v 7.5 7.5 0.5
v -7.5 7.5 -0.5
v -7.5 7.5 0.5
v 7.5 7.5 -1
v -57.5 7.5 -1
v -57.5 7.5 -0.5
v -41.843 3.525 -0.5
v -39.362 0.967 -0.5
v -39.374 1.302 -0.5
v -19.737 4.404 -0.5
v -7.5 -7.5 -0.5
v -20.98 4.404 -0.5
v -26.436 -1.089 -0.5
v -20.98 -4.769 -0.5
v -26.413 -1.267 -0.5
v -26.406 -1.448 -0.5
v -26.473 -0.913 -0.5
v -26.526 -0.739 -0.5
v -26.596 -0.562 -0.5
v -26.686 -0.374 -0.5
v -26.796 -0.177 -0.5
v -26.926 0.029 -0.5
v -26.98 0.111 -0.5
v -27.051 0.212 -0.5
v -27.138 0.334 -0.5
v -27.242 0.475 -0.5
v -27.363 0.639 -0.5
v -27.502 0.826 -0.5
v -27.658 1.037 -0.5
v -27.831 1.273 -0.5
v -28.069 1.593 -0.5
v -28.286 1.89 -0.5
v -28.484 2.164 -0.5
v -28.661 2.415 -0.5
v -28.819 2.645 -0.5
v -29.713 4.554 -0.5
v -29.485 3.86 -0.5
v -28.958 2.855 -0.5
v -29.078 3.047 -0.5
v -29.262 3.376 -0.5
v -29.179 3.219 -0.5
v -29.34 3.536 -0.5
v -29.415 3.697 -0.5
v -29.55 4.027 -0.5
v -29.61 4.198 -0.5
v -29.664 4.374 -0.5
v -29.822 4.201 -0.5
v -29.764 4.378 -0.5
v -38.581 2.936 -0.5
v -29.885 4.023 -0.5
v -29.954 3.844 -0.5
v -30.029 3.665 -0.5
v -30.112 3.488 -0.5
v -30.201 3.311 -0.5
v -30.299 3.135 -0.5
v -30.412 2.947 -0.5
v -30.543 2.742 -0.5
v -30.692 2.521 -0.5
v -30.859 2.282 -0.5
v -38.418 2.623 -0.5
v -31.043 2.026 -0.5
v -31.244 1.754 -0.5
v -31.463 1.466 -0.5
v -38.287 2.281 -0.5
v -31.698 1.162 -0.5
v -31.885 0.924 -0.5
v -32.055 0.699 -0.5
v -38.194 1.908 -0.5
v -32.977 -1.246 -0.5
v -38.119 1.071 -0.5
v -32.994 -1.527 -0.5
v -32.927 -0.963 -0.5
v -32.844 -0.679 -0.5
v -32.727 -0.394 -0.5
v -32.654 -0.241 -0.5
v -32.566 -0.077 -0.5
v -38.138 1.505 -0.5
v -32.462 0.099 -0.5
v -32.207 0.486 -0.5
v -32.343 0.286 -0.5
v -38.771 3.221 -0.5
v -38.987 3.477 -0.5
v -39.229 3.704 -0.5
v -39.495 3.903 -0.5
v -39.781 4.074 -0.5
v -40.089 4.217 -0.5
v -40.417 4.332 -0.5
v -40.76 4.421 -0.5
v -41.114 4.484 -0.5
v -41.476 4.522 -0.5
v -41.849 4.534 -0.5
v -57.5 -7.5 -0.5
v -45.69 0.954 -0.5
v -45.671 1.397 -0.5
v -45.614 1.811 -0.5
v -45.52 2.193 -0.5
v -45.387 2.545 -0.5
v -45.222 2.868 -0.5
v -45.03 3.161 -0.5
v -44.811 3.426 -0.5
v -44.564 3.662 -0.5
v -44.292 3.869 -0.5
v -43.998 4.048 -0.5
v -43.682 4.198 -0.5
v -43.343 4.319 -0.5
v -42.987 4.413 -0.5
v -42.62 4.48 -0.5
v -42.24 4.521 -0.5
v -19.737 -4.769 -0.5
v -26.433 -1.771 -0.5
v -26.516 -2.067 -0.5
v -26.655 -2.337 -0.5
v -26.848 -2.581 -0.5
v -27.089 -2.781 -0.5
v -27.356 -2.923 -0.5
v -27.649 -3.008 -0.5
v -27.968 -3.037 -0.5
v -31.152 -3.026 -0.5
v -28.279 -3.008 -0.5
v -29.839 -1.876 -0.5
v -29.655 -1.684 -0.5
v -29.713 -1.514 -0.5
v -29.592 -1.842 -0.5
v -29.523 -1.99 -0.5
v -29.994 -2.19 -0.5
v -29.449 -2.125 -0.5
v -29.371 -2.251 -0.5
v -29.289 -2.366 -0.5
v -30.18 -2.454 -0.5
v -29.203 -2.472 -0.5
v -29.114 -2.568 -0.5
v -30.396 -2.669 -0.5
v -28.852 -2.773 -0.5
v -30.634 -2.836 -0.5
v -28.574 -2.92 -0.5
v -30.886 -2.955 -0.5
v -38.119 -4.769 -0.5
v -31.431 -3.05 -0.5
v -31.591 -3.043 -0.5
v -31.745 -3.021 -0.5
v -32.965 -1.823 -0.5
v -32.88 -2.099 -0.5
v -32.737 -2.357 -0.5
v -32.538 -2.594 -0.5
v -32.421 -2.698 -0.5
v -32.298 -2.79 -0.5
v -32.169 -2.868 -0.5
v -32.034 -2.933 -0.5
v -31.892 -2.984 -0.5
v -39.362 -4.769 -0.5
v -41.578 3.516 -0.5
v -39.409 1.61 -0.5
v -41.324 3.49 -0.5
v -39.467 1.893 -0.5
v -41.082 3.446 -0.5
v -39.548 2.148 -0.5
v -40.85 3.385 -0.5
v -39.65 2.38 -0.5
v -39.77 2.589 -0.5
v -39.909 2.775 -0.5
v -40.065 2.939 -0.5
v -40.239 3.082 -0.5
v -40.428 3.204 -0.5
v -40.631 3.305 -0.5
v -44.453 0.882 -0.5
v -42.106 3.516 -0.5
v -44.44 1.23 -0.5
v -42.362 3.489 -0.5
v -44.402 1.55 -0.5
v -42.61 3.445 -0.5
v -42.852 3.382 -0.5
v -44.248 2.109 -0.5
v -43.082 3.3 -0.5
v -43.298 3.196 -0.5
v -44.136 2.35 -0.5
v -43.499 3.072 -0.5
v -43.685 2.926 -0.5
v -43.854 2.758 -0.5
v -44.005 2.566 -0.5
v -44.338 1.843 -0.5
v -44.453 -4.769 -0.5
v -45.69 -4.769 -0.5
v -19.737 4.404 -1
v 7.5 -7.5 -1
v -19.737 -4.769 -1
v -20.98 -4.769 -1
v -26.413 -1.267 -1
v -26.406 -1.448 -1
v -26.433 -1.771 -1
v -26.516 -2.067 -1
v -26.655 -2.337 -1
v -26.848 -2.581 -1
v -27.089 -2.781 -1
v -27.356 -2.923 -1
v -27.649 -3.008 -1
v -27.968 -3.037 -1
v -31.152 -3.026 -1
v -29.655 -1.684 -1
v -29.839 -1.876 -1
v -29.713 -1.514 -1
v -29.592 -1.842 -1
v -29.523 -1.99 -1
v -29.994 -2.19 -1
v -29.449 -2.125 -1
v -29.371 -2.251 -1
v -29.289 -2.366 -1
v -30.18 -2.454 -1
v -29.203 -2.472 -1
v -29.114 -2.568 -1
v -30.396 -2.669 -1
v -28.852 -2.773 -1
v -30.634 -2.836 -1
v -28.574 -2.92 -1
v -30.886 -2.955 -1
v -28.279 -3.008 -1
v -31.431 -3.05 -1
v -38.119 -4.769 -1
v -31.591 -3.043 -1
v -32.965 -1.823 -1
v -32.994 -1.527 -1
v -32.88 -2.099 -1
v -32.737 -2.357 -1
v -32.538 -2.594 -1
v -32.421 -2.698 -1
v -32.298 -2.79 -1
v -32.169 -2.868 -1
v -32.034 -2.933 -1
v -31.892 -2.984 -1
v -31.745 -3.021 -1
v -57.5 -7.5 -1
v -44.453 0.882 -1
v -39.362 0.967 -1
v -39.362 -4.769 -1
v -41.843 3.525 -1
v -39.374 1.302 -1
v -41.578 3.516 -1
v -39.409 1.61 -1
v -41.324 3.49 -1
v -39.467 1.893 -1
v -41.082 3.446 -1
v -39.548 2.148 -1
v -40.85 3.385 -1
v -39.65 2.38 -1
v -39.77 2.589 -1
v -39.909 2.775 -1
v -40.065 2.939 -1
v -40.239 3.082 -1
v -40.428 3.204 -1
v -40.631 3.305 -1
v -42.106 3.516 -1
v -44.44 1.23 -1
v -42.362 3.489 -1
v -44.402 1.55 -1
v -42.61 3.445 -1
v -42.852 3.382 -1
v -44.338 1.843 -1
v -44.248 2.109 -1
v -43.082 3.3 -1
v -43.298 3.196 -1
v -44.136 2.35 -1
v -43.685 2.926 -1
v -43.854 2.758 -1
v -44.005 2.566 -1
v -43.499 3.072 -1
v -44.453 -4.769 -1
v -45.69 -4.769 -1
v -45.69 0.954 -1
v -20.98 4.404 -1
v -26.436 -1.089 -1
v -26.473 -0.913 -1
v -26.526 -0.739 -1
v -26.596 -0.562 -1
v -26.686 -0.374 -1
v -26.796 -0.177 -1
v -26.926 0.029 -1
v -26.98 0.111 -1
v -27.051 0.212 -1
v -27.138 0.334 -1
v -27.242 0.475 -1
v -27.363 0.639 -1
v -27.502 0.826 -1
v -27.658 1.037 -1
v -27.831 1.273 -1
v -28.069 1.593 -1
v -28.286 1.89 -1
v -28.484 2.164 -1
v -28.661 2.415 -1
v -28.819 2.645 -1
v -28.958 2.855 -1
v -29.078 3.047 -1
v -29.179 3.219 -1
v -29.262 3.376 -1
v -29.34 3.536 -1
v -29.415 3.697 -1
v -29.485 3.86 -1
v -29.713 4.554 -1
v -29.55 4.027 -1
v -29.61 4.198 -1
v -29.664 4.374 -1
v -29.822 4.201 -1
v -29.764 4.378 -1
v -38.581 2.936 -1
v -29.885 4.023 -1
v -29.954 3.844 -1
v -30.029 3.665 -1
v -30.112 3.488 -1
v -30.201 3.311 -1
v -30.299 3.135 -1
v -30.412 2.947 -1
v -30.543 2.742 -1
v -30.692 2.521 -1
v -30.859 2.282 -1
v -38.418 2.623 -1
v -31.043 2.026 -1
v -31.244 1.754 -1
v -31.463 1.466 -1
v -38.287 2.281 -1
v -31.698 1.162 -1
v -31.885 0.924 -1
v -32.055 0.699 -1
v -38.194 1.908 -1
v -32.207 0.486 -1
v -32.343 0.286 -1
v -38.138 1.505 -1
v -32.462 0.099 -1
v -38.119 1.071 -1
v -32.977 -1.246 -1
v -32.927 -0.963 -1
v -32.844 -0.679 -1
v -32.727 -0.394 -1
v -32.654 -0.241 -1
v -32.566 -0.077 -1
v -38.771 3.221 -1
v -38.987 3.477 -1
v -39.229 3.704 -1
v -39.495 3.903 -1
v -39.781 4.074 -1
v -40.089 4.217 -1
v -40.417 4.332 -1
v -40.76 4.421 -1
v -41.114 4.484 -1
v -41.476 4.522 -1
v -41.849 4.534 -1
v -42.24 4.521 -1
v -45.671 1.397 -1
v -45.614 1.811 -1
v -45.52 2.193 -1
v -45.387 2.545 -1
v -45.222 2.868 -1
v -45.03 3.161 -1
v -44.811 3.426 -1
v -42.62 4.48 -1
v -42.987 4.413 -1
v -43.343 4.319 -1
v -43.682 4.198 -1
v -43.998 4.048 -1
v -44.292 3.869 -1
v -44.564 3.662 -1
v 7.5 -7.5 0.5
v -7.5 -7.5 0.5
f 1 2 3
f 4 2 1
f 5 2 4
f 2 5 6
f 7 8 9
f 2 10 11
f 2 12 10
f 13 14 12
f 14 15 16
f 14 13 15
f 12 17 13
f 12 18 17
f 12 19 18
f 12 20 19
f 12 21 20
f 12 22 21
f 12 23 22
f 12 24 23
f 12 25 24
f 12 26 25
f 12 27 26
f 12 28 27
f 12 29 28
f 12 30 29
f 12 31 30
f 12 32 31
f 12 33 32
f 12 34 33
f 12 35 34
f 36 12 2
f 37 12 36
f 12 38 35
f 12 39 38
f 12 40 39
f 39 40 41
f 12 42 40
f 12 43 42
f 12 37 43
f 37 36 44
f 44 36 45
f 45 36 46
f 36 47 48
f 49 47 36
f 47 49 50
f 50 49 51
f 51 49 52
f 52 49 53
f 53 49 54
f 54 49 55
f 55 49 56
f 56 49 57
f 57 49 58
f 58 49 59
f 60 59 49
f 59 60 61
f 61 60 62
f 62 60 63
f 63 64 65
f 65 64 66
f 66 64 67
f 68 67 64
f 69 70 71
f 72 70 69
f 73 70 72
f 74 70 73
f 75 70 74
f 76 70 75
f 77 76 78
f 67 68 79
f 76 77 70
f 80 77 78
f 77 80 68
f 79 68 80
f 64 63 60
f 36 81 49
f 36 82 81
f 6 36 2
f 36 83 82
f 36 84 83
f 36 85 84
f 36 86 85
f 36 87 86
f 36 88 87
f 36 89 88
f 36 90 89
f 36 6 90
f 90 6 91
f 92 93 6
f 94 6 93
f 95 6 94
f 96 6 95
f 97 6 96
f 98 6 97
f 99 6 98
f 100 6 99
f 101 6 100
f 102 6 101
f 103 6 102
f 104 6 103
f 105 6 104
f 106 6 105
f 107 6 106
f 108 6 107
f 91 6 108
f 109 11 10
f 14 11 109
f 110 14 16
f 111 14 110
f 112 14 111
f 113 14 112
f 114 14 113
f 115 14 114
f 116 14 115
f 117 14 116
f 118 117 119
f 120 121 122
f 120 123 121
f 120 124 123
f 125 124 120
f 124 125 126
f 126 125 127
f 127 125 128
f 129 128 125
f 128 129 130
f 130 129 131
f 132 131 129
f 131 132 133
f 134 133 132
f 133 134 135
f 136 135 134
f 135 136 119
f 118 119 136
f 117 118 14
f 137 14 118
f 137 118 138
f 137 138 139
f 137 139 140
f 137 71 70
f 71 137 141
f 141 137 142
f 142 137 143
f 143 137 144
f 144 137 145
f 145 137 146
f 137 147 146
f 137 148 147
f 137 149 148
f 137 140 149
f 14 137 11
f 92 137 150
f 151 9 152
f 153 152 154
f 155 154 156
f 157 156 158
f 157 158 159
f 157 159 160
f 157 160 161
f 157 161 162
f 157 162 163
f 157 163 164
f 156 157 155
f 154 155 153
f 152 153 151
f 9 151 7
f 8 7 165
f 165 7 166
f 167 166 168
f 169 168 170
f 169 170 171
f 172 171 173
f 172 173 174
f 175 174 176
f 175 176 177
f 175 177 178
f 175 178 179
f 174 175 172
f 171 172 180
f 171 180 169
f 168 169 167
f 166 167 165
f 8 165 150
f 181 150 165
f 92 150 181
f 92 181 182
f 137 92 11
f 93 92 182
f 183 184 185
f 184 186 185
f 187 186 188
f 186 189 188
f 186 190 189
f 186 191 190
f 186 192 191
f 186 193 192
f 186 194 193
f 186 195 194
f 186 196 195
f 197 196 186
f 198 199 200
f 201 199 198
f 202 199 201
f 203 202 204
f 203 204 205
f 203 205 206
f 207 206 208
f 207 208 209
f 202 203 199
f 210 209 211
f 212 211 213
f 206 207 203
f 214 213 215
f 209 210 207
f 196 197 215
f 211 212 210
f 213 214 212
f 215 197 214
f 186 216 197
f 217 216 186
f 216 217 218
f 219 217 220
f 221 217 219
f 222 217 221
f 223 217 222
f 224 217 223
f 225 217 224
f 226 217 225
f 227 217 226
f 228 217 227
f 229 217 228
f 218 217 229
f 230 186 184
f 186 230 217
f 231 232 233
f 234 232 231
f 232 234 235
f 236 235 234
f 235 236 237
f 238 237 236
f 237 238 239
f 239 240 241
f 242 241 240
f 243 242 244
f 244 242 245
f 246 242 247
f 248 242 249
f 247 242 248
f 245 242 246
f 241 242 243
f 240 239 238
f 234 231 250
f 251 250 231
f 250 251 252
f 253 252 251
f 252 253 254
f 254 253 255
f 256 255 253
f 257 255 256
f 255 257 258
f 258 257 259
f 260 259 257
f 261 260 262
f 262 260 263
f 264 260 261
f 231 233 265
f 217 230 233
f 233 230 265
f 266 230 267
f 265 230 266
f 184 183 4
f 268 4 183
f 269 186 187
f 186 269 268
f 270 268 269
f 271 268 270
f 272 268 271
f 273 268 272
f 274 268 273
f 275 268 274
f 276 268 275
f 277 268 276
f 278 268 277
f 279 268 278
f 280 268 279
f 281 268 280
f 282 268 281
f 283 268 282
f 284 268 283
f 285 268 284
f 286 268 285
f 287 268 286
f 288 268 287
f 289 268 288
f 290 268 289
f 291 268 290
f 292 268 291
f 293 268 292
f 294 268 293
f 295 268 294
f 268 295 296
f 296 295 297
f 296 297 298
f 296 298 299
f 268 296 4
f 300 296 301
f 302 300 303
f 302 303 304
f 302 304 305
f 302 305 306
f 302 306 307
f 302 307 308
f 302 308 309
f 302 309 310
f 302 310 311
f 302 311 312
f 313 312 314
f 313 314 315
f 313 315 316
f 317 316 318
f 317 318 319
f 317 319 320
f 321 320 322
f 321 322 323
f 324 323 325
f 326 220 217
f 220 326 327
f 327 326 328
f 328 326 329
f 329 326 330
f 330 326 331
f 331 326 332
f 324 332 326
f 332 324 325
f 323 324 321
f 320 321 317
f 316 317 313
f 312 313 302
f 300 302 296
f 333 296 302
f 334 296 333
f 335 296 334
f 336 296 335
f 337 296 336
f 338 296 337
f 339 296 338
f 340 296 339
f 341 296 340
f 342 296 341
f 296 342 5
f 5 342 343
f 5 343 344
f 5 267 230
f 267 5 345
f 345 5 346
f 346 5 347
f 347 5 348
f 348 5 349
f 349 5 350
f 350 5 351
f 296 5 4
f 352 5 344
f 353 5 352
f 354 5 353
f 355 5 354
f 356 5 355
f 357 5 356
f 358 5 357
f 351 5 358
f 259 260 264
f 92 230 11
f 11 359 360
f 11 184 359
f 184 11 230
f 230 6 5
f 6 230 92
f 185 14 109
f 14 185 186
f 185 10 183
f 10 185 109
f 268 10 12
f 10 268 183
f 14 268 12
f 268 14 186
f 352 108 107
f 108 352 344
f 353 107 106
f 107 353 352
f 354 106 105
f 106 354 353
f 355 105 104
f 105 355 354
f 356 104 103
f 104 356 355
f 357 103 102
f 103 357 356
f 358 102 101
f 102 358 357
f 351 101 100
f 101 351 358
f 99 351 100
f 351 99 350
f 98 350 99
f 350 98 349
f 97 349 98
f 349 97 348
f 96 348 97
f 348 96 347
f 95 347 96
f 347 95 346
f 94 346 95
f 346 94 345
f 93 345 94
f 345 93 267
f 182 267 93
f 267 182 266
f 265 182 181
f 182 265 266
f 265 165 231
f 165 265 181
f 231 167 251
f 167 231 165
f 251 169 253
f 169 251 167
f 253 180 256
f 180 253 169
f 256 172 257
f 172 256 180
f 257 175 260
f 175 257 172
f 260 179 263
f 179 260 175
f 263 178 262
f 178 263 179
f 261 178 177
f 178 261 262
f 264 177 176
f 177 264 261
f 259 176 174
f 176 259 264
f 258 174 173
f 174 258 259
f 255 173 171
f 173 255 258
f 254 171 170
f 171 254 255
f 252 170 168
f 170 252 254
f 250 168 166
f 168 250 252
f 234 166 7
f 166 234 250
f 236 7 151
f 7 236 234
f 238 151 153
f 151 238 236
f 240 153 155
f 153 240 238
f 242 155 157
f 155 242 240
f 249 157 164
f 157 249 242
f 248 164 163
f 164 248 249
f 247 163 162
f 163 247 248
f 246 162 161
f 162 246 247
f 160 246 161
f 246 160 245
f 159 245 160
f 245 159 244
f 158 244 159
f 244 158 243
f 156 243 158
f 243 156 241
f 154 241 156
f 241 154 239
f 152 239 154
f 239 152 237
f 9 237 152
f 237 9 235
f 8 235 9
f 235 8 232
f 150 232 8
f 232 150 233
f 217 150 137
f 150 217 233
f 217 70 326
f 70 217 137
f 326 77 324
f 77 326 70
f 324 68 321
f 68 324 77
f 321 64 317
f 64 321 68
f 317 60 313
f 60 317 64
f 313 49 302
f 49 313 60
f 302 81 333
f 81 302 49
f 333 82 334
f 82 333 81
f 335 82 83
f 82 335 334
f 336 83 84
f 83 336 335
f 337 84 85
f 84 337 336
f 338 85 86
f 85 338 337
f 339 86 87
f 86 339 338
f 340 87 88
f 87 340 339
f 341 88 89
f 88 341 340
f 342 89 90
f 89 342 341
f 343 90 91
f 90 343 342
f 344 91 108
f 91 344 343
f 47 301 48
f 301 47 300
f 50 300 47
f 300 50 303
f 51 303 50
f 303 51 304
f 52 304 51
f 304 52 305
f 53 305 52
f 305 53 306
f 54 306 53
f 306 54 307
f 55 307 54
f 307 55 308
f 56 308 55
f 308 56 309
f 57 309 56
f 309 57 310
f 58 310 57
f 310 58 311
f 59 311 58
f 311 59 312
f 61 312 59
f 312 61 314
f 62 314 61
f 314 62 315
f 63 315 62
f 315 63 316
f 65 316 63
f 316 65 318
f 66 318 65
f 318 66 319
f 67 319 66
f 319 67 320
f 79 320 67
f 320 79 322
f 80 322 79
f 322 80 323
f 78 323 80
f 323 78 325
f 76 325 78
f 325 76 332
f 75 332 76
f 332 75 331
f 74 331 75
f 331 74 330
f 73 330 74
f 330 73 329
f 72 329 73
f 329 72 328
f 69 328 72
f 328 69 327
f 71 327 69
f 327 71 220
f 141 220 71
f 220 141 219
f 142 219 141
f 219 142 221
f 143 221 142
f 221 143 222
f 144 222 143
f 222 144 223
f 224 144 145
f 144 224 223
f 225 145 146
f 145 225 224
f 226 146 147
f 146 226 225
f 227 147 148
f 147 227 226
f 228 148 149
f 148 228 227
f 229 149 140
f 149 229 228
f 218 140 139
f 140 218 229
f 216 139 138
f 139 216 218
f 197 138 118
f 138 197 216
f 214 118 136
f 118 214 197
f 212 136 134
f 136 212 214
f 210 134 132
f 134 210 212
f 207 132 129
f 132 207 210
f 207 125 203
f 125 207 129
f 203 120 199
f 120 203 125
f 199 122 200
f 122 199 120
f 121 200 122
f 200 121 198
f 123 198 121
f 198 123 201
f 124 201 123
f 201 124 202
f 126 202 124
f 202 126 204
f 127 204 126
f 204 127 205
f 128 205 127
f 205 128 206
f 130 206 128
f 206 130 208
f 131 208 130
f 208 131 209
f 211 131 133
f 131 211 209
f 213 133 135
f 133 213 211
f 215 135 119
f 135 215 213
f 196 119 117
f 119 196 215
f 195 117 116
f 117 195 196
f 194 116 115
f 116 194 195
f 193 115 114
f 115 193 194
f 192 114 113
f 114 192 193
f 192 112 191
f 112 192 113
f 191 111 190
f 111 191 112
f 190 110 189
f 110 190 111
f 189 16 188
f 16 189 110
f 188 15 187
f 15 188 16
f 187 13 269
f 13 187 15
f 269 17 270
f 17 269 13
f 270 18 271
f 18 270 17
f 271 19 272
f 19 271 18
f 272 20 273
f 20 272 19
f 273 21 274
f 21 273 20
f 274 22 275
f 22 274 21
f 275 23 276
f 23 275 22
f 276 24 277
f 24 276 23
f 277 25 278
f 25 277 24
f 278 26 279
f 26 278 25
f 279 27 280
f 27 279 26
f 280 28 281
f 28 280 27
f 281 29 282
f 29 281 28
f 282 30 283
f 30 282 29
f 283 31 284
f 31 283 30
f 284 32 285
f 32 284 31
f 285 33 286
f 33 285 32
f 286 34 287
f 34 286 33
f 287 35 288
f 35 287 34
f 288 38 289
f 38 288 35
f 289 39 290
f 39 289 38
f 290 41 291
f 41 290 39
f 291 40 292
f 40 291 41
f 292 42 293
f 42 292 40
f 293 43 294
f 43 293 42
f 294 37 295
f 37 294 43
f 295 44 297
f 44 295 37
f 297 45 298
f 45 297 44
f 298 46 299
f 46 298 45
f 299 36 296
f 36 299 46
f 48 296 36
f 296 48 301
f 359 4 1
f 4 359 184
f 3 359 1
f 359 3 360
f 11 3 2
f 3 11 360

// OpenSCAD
// preview[view:north west, tilt:top diagonal]

/* Customizable Bookmark */


/* [Tag] */
// Text of the tag (use ♥ for heart)
text = "I ♥ U";
//Lenght of the tag
lenght = 50;//[20:1:100]
// Thickness of the tag
thick = 0.5; //[0.1:0.1:2]
/* [Head] */
//Thickness of the head
head_thick = 1; //[0.5:0.5:4]
//Height of the print on the head
head_height = 1; //[1:0.5:3]
//Rotation of image
rotation = 0;//[270:Bottom,0:Right,90:Top,180:Left]
//15x15 image on the head
image = "img.png";//[image_surface:61x61]

/*[ Miscellaneous] */
tag_color = "Crimson";
head_color = "Olive";
//Scale of image. You should NOT change that. 
image_scale = 1/15;
//Second scale for customizer. You should NOT change that. 
imgs = 1/4;
//If in customizer should be true. Do NOT change ! 
customizer = 1;//[1:True,0:False]

//// 0 : LOCAL ||||| 1 : CUSTOMIZER (Images are not generated the same way)


/* [Hidden] */
//Thickness to prevent 0 thick surface. DO NOT ALTER. 
over = 0.2;

//Width of the tag
width = 15;

//Space around the text
gap = 2;

//size of the head
head = width;

/*Start*/

/*We draw the tag and the text with the corresponding size*/
hsize = (width-(2*gap));
vsize = (lenght-gap)/(len(text));

//if(hsize*len(text)>(lenght-gap)) Change this if you want to change the size of the tag
rotate([0,0,90]) translate([0,lenght/2+head/2,-head_thick/2-thick/2]) if(hsize*len(text)>(lenght-gap)){//if(len(text)>=6){
    echo("Other size\n             ========");
   drawTag(width,lenght,thick,text,vsize,head);
}
else
{
   drawTag(width,lenght,thick,text,hsize,head);
}

/*We draw the head*/

color(head_color) rotate([0,0,rotation]) drawHead(head,head_thick,image,image_scale,head_height);



/*MODULES*/

//Let's draw the tag with the text
module drawTag(width,lenght,thick,string,textSize,head)
{
    union()
    {
    color(tag_color) difference(){
    cube([width,lenght,thick],center=true);
    translate([0,0,-thick/2-over/2]) linear_extrude(thick+over) rotate([0,0,90]) text(string,textSize,halign="center",valign="center");
    }
    color(head_color)
    translate([0,-lenght/2-head/2,0]) cube([width,head,thick],center=true);
    }
}

//Let's draw the head
module drawHead(head,head_thick,image,image_scale,head_height) {
    cube([head,head,head_thick],center=true);
    
    if(customizer==0)
    {
    translate([0,0,head_height+head_thick/2]) rotate([0,0,270]) scale([image_scale,image_scale,head_height/100]) surface(image,center=true,invert=true);
    }
    else
    {
        translate([0,0,head_thick/2+head_height/2+thick]) rotate([0,0,270]) scale([imgs,imgs,head_height]) surface(image,center=true);
    }
}
